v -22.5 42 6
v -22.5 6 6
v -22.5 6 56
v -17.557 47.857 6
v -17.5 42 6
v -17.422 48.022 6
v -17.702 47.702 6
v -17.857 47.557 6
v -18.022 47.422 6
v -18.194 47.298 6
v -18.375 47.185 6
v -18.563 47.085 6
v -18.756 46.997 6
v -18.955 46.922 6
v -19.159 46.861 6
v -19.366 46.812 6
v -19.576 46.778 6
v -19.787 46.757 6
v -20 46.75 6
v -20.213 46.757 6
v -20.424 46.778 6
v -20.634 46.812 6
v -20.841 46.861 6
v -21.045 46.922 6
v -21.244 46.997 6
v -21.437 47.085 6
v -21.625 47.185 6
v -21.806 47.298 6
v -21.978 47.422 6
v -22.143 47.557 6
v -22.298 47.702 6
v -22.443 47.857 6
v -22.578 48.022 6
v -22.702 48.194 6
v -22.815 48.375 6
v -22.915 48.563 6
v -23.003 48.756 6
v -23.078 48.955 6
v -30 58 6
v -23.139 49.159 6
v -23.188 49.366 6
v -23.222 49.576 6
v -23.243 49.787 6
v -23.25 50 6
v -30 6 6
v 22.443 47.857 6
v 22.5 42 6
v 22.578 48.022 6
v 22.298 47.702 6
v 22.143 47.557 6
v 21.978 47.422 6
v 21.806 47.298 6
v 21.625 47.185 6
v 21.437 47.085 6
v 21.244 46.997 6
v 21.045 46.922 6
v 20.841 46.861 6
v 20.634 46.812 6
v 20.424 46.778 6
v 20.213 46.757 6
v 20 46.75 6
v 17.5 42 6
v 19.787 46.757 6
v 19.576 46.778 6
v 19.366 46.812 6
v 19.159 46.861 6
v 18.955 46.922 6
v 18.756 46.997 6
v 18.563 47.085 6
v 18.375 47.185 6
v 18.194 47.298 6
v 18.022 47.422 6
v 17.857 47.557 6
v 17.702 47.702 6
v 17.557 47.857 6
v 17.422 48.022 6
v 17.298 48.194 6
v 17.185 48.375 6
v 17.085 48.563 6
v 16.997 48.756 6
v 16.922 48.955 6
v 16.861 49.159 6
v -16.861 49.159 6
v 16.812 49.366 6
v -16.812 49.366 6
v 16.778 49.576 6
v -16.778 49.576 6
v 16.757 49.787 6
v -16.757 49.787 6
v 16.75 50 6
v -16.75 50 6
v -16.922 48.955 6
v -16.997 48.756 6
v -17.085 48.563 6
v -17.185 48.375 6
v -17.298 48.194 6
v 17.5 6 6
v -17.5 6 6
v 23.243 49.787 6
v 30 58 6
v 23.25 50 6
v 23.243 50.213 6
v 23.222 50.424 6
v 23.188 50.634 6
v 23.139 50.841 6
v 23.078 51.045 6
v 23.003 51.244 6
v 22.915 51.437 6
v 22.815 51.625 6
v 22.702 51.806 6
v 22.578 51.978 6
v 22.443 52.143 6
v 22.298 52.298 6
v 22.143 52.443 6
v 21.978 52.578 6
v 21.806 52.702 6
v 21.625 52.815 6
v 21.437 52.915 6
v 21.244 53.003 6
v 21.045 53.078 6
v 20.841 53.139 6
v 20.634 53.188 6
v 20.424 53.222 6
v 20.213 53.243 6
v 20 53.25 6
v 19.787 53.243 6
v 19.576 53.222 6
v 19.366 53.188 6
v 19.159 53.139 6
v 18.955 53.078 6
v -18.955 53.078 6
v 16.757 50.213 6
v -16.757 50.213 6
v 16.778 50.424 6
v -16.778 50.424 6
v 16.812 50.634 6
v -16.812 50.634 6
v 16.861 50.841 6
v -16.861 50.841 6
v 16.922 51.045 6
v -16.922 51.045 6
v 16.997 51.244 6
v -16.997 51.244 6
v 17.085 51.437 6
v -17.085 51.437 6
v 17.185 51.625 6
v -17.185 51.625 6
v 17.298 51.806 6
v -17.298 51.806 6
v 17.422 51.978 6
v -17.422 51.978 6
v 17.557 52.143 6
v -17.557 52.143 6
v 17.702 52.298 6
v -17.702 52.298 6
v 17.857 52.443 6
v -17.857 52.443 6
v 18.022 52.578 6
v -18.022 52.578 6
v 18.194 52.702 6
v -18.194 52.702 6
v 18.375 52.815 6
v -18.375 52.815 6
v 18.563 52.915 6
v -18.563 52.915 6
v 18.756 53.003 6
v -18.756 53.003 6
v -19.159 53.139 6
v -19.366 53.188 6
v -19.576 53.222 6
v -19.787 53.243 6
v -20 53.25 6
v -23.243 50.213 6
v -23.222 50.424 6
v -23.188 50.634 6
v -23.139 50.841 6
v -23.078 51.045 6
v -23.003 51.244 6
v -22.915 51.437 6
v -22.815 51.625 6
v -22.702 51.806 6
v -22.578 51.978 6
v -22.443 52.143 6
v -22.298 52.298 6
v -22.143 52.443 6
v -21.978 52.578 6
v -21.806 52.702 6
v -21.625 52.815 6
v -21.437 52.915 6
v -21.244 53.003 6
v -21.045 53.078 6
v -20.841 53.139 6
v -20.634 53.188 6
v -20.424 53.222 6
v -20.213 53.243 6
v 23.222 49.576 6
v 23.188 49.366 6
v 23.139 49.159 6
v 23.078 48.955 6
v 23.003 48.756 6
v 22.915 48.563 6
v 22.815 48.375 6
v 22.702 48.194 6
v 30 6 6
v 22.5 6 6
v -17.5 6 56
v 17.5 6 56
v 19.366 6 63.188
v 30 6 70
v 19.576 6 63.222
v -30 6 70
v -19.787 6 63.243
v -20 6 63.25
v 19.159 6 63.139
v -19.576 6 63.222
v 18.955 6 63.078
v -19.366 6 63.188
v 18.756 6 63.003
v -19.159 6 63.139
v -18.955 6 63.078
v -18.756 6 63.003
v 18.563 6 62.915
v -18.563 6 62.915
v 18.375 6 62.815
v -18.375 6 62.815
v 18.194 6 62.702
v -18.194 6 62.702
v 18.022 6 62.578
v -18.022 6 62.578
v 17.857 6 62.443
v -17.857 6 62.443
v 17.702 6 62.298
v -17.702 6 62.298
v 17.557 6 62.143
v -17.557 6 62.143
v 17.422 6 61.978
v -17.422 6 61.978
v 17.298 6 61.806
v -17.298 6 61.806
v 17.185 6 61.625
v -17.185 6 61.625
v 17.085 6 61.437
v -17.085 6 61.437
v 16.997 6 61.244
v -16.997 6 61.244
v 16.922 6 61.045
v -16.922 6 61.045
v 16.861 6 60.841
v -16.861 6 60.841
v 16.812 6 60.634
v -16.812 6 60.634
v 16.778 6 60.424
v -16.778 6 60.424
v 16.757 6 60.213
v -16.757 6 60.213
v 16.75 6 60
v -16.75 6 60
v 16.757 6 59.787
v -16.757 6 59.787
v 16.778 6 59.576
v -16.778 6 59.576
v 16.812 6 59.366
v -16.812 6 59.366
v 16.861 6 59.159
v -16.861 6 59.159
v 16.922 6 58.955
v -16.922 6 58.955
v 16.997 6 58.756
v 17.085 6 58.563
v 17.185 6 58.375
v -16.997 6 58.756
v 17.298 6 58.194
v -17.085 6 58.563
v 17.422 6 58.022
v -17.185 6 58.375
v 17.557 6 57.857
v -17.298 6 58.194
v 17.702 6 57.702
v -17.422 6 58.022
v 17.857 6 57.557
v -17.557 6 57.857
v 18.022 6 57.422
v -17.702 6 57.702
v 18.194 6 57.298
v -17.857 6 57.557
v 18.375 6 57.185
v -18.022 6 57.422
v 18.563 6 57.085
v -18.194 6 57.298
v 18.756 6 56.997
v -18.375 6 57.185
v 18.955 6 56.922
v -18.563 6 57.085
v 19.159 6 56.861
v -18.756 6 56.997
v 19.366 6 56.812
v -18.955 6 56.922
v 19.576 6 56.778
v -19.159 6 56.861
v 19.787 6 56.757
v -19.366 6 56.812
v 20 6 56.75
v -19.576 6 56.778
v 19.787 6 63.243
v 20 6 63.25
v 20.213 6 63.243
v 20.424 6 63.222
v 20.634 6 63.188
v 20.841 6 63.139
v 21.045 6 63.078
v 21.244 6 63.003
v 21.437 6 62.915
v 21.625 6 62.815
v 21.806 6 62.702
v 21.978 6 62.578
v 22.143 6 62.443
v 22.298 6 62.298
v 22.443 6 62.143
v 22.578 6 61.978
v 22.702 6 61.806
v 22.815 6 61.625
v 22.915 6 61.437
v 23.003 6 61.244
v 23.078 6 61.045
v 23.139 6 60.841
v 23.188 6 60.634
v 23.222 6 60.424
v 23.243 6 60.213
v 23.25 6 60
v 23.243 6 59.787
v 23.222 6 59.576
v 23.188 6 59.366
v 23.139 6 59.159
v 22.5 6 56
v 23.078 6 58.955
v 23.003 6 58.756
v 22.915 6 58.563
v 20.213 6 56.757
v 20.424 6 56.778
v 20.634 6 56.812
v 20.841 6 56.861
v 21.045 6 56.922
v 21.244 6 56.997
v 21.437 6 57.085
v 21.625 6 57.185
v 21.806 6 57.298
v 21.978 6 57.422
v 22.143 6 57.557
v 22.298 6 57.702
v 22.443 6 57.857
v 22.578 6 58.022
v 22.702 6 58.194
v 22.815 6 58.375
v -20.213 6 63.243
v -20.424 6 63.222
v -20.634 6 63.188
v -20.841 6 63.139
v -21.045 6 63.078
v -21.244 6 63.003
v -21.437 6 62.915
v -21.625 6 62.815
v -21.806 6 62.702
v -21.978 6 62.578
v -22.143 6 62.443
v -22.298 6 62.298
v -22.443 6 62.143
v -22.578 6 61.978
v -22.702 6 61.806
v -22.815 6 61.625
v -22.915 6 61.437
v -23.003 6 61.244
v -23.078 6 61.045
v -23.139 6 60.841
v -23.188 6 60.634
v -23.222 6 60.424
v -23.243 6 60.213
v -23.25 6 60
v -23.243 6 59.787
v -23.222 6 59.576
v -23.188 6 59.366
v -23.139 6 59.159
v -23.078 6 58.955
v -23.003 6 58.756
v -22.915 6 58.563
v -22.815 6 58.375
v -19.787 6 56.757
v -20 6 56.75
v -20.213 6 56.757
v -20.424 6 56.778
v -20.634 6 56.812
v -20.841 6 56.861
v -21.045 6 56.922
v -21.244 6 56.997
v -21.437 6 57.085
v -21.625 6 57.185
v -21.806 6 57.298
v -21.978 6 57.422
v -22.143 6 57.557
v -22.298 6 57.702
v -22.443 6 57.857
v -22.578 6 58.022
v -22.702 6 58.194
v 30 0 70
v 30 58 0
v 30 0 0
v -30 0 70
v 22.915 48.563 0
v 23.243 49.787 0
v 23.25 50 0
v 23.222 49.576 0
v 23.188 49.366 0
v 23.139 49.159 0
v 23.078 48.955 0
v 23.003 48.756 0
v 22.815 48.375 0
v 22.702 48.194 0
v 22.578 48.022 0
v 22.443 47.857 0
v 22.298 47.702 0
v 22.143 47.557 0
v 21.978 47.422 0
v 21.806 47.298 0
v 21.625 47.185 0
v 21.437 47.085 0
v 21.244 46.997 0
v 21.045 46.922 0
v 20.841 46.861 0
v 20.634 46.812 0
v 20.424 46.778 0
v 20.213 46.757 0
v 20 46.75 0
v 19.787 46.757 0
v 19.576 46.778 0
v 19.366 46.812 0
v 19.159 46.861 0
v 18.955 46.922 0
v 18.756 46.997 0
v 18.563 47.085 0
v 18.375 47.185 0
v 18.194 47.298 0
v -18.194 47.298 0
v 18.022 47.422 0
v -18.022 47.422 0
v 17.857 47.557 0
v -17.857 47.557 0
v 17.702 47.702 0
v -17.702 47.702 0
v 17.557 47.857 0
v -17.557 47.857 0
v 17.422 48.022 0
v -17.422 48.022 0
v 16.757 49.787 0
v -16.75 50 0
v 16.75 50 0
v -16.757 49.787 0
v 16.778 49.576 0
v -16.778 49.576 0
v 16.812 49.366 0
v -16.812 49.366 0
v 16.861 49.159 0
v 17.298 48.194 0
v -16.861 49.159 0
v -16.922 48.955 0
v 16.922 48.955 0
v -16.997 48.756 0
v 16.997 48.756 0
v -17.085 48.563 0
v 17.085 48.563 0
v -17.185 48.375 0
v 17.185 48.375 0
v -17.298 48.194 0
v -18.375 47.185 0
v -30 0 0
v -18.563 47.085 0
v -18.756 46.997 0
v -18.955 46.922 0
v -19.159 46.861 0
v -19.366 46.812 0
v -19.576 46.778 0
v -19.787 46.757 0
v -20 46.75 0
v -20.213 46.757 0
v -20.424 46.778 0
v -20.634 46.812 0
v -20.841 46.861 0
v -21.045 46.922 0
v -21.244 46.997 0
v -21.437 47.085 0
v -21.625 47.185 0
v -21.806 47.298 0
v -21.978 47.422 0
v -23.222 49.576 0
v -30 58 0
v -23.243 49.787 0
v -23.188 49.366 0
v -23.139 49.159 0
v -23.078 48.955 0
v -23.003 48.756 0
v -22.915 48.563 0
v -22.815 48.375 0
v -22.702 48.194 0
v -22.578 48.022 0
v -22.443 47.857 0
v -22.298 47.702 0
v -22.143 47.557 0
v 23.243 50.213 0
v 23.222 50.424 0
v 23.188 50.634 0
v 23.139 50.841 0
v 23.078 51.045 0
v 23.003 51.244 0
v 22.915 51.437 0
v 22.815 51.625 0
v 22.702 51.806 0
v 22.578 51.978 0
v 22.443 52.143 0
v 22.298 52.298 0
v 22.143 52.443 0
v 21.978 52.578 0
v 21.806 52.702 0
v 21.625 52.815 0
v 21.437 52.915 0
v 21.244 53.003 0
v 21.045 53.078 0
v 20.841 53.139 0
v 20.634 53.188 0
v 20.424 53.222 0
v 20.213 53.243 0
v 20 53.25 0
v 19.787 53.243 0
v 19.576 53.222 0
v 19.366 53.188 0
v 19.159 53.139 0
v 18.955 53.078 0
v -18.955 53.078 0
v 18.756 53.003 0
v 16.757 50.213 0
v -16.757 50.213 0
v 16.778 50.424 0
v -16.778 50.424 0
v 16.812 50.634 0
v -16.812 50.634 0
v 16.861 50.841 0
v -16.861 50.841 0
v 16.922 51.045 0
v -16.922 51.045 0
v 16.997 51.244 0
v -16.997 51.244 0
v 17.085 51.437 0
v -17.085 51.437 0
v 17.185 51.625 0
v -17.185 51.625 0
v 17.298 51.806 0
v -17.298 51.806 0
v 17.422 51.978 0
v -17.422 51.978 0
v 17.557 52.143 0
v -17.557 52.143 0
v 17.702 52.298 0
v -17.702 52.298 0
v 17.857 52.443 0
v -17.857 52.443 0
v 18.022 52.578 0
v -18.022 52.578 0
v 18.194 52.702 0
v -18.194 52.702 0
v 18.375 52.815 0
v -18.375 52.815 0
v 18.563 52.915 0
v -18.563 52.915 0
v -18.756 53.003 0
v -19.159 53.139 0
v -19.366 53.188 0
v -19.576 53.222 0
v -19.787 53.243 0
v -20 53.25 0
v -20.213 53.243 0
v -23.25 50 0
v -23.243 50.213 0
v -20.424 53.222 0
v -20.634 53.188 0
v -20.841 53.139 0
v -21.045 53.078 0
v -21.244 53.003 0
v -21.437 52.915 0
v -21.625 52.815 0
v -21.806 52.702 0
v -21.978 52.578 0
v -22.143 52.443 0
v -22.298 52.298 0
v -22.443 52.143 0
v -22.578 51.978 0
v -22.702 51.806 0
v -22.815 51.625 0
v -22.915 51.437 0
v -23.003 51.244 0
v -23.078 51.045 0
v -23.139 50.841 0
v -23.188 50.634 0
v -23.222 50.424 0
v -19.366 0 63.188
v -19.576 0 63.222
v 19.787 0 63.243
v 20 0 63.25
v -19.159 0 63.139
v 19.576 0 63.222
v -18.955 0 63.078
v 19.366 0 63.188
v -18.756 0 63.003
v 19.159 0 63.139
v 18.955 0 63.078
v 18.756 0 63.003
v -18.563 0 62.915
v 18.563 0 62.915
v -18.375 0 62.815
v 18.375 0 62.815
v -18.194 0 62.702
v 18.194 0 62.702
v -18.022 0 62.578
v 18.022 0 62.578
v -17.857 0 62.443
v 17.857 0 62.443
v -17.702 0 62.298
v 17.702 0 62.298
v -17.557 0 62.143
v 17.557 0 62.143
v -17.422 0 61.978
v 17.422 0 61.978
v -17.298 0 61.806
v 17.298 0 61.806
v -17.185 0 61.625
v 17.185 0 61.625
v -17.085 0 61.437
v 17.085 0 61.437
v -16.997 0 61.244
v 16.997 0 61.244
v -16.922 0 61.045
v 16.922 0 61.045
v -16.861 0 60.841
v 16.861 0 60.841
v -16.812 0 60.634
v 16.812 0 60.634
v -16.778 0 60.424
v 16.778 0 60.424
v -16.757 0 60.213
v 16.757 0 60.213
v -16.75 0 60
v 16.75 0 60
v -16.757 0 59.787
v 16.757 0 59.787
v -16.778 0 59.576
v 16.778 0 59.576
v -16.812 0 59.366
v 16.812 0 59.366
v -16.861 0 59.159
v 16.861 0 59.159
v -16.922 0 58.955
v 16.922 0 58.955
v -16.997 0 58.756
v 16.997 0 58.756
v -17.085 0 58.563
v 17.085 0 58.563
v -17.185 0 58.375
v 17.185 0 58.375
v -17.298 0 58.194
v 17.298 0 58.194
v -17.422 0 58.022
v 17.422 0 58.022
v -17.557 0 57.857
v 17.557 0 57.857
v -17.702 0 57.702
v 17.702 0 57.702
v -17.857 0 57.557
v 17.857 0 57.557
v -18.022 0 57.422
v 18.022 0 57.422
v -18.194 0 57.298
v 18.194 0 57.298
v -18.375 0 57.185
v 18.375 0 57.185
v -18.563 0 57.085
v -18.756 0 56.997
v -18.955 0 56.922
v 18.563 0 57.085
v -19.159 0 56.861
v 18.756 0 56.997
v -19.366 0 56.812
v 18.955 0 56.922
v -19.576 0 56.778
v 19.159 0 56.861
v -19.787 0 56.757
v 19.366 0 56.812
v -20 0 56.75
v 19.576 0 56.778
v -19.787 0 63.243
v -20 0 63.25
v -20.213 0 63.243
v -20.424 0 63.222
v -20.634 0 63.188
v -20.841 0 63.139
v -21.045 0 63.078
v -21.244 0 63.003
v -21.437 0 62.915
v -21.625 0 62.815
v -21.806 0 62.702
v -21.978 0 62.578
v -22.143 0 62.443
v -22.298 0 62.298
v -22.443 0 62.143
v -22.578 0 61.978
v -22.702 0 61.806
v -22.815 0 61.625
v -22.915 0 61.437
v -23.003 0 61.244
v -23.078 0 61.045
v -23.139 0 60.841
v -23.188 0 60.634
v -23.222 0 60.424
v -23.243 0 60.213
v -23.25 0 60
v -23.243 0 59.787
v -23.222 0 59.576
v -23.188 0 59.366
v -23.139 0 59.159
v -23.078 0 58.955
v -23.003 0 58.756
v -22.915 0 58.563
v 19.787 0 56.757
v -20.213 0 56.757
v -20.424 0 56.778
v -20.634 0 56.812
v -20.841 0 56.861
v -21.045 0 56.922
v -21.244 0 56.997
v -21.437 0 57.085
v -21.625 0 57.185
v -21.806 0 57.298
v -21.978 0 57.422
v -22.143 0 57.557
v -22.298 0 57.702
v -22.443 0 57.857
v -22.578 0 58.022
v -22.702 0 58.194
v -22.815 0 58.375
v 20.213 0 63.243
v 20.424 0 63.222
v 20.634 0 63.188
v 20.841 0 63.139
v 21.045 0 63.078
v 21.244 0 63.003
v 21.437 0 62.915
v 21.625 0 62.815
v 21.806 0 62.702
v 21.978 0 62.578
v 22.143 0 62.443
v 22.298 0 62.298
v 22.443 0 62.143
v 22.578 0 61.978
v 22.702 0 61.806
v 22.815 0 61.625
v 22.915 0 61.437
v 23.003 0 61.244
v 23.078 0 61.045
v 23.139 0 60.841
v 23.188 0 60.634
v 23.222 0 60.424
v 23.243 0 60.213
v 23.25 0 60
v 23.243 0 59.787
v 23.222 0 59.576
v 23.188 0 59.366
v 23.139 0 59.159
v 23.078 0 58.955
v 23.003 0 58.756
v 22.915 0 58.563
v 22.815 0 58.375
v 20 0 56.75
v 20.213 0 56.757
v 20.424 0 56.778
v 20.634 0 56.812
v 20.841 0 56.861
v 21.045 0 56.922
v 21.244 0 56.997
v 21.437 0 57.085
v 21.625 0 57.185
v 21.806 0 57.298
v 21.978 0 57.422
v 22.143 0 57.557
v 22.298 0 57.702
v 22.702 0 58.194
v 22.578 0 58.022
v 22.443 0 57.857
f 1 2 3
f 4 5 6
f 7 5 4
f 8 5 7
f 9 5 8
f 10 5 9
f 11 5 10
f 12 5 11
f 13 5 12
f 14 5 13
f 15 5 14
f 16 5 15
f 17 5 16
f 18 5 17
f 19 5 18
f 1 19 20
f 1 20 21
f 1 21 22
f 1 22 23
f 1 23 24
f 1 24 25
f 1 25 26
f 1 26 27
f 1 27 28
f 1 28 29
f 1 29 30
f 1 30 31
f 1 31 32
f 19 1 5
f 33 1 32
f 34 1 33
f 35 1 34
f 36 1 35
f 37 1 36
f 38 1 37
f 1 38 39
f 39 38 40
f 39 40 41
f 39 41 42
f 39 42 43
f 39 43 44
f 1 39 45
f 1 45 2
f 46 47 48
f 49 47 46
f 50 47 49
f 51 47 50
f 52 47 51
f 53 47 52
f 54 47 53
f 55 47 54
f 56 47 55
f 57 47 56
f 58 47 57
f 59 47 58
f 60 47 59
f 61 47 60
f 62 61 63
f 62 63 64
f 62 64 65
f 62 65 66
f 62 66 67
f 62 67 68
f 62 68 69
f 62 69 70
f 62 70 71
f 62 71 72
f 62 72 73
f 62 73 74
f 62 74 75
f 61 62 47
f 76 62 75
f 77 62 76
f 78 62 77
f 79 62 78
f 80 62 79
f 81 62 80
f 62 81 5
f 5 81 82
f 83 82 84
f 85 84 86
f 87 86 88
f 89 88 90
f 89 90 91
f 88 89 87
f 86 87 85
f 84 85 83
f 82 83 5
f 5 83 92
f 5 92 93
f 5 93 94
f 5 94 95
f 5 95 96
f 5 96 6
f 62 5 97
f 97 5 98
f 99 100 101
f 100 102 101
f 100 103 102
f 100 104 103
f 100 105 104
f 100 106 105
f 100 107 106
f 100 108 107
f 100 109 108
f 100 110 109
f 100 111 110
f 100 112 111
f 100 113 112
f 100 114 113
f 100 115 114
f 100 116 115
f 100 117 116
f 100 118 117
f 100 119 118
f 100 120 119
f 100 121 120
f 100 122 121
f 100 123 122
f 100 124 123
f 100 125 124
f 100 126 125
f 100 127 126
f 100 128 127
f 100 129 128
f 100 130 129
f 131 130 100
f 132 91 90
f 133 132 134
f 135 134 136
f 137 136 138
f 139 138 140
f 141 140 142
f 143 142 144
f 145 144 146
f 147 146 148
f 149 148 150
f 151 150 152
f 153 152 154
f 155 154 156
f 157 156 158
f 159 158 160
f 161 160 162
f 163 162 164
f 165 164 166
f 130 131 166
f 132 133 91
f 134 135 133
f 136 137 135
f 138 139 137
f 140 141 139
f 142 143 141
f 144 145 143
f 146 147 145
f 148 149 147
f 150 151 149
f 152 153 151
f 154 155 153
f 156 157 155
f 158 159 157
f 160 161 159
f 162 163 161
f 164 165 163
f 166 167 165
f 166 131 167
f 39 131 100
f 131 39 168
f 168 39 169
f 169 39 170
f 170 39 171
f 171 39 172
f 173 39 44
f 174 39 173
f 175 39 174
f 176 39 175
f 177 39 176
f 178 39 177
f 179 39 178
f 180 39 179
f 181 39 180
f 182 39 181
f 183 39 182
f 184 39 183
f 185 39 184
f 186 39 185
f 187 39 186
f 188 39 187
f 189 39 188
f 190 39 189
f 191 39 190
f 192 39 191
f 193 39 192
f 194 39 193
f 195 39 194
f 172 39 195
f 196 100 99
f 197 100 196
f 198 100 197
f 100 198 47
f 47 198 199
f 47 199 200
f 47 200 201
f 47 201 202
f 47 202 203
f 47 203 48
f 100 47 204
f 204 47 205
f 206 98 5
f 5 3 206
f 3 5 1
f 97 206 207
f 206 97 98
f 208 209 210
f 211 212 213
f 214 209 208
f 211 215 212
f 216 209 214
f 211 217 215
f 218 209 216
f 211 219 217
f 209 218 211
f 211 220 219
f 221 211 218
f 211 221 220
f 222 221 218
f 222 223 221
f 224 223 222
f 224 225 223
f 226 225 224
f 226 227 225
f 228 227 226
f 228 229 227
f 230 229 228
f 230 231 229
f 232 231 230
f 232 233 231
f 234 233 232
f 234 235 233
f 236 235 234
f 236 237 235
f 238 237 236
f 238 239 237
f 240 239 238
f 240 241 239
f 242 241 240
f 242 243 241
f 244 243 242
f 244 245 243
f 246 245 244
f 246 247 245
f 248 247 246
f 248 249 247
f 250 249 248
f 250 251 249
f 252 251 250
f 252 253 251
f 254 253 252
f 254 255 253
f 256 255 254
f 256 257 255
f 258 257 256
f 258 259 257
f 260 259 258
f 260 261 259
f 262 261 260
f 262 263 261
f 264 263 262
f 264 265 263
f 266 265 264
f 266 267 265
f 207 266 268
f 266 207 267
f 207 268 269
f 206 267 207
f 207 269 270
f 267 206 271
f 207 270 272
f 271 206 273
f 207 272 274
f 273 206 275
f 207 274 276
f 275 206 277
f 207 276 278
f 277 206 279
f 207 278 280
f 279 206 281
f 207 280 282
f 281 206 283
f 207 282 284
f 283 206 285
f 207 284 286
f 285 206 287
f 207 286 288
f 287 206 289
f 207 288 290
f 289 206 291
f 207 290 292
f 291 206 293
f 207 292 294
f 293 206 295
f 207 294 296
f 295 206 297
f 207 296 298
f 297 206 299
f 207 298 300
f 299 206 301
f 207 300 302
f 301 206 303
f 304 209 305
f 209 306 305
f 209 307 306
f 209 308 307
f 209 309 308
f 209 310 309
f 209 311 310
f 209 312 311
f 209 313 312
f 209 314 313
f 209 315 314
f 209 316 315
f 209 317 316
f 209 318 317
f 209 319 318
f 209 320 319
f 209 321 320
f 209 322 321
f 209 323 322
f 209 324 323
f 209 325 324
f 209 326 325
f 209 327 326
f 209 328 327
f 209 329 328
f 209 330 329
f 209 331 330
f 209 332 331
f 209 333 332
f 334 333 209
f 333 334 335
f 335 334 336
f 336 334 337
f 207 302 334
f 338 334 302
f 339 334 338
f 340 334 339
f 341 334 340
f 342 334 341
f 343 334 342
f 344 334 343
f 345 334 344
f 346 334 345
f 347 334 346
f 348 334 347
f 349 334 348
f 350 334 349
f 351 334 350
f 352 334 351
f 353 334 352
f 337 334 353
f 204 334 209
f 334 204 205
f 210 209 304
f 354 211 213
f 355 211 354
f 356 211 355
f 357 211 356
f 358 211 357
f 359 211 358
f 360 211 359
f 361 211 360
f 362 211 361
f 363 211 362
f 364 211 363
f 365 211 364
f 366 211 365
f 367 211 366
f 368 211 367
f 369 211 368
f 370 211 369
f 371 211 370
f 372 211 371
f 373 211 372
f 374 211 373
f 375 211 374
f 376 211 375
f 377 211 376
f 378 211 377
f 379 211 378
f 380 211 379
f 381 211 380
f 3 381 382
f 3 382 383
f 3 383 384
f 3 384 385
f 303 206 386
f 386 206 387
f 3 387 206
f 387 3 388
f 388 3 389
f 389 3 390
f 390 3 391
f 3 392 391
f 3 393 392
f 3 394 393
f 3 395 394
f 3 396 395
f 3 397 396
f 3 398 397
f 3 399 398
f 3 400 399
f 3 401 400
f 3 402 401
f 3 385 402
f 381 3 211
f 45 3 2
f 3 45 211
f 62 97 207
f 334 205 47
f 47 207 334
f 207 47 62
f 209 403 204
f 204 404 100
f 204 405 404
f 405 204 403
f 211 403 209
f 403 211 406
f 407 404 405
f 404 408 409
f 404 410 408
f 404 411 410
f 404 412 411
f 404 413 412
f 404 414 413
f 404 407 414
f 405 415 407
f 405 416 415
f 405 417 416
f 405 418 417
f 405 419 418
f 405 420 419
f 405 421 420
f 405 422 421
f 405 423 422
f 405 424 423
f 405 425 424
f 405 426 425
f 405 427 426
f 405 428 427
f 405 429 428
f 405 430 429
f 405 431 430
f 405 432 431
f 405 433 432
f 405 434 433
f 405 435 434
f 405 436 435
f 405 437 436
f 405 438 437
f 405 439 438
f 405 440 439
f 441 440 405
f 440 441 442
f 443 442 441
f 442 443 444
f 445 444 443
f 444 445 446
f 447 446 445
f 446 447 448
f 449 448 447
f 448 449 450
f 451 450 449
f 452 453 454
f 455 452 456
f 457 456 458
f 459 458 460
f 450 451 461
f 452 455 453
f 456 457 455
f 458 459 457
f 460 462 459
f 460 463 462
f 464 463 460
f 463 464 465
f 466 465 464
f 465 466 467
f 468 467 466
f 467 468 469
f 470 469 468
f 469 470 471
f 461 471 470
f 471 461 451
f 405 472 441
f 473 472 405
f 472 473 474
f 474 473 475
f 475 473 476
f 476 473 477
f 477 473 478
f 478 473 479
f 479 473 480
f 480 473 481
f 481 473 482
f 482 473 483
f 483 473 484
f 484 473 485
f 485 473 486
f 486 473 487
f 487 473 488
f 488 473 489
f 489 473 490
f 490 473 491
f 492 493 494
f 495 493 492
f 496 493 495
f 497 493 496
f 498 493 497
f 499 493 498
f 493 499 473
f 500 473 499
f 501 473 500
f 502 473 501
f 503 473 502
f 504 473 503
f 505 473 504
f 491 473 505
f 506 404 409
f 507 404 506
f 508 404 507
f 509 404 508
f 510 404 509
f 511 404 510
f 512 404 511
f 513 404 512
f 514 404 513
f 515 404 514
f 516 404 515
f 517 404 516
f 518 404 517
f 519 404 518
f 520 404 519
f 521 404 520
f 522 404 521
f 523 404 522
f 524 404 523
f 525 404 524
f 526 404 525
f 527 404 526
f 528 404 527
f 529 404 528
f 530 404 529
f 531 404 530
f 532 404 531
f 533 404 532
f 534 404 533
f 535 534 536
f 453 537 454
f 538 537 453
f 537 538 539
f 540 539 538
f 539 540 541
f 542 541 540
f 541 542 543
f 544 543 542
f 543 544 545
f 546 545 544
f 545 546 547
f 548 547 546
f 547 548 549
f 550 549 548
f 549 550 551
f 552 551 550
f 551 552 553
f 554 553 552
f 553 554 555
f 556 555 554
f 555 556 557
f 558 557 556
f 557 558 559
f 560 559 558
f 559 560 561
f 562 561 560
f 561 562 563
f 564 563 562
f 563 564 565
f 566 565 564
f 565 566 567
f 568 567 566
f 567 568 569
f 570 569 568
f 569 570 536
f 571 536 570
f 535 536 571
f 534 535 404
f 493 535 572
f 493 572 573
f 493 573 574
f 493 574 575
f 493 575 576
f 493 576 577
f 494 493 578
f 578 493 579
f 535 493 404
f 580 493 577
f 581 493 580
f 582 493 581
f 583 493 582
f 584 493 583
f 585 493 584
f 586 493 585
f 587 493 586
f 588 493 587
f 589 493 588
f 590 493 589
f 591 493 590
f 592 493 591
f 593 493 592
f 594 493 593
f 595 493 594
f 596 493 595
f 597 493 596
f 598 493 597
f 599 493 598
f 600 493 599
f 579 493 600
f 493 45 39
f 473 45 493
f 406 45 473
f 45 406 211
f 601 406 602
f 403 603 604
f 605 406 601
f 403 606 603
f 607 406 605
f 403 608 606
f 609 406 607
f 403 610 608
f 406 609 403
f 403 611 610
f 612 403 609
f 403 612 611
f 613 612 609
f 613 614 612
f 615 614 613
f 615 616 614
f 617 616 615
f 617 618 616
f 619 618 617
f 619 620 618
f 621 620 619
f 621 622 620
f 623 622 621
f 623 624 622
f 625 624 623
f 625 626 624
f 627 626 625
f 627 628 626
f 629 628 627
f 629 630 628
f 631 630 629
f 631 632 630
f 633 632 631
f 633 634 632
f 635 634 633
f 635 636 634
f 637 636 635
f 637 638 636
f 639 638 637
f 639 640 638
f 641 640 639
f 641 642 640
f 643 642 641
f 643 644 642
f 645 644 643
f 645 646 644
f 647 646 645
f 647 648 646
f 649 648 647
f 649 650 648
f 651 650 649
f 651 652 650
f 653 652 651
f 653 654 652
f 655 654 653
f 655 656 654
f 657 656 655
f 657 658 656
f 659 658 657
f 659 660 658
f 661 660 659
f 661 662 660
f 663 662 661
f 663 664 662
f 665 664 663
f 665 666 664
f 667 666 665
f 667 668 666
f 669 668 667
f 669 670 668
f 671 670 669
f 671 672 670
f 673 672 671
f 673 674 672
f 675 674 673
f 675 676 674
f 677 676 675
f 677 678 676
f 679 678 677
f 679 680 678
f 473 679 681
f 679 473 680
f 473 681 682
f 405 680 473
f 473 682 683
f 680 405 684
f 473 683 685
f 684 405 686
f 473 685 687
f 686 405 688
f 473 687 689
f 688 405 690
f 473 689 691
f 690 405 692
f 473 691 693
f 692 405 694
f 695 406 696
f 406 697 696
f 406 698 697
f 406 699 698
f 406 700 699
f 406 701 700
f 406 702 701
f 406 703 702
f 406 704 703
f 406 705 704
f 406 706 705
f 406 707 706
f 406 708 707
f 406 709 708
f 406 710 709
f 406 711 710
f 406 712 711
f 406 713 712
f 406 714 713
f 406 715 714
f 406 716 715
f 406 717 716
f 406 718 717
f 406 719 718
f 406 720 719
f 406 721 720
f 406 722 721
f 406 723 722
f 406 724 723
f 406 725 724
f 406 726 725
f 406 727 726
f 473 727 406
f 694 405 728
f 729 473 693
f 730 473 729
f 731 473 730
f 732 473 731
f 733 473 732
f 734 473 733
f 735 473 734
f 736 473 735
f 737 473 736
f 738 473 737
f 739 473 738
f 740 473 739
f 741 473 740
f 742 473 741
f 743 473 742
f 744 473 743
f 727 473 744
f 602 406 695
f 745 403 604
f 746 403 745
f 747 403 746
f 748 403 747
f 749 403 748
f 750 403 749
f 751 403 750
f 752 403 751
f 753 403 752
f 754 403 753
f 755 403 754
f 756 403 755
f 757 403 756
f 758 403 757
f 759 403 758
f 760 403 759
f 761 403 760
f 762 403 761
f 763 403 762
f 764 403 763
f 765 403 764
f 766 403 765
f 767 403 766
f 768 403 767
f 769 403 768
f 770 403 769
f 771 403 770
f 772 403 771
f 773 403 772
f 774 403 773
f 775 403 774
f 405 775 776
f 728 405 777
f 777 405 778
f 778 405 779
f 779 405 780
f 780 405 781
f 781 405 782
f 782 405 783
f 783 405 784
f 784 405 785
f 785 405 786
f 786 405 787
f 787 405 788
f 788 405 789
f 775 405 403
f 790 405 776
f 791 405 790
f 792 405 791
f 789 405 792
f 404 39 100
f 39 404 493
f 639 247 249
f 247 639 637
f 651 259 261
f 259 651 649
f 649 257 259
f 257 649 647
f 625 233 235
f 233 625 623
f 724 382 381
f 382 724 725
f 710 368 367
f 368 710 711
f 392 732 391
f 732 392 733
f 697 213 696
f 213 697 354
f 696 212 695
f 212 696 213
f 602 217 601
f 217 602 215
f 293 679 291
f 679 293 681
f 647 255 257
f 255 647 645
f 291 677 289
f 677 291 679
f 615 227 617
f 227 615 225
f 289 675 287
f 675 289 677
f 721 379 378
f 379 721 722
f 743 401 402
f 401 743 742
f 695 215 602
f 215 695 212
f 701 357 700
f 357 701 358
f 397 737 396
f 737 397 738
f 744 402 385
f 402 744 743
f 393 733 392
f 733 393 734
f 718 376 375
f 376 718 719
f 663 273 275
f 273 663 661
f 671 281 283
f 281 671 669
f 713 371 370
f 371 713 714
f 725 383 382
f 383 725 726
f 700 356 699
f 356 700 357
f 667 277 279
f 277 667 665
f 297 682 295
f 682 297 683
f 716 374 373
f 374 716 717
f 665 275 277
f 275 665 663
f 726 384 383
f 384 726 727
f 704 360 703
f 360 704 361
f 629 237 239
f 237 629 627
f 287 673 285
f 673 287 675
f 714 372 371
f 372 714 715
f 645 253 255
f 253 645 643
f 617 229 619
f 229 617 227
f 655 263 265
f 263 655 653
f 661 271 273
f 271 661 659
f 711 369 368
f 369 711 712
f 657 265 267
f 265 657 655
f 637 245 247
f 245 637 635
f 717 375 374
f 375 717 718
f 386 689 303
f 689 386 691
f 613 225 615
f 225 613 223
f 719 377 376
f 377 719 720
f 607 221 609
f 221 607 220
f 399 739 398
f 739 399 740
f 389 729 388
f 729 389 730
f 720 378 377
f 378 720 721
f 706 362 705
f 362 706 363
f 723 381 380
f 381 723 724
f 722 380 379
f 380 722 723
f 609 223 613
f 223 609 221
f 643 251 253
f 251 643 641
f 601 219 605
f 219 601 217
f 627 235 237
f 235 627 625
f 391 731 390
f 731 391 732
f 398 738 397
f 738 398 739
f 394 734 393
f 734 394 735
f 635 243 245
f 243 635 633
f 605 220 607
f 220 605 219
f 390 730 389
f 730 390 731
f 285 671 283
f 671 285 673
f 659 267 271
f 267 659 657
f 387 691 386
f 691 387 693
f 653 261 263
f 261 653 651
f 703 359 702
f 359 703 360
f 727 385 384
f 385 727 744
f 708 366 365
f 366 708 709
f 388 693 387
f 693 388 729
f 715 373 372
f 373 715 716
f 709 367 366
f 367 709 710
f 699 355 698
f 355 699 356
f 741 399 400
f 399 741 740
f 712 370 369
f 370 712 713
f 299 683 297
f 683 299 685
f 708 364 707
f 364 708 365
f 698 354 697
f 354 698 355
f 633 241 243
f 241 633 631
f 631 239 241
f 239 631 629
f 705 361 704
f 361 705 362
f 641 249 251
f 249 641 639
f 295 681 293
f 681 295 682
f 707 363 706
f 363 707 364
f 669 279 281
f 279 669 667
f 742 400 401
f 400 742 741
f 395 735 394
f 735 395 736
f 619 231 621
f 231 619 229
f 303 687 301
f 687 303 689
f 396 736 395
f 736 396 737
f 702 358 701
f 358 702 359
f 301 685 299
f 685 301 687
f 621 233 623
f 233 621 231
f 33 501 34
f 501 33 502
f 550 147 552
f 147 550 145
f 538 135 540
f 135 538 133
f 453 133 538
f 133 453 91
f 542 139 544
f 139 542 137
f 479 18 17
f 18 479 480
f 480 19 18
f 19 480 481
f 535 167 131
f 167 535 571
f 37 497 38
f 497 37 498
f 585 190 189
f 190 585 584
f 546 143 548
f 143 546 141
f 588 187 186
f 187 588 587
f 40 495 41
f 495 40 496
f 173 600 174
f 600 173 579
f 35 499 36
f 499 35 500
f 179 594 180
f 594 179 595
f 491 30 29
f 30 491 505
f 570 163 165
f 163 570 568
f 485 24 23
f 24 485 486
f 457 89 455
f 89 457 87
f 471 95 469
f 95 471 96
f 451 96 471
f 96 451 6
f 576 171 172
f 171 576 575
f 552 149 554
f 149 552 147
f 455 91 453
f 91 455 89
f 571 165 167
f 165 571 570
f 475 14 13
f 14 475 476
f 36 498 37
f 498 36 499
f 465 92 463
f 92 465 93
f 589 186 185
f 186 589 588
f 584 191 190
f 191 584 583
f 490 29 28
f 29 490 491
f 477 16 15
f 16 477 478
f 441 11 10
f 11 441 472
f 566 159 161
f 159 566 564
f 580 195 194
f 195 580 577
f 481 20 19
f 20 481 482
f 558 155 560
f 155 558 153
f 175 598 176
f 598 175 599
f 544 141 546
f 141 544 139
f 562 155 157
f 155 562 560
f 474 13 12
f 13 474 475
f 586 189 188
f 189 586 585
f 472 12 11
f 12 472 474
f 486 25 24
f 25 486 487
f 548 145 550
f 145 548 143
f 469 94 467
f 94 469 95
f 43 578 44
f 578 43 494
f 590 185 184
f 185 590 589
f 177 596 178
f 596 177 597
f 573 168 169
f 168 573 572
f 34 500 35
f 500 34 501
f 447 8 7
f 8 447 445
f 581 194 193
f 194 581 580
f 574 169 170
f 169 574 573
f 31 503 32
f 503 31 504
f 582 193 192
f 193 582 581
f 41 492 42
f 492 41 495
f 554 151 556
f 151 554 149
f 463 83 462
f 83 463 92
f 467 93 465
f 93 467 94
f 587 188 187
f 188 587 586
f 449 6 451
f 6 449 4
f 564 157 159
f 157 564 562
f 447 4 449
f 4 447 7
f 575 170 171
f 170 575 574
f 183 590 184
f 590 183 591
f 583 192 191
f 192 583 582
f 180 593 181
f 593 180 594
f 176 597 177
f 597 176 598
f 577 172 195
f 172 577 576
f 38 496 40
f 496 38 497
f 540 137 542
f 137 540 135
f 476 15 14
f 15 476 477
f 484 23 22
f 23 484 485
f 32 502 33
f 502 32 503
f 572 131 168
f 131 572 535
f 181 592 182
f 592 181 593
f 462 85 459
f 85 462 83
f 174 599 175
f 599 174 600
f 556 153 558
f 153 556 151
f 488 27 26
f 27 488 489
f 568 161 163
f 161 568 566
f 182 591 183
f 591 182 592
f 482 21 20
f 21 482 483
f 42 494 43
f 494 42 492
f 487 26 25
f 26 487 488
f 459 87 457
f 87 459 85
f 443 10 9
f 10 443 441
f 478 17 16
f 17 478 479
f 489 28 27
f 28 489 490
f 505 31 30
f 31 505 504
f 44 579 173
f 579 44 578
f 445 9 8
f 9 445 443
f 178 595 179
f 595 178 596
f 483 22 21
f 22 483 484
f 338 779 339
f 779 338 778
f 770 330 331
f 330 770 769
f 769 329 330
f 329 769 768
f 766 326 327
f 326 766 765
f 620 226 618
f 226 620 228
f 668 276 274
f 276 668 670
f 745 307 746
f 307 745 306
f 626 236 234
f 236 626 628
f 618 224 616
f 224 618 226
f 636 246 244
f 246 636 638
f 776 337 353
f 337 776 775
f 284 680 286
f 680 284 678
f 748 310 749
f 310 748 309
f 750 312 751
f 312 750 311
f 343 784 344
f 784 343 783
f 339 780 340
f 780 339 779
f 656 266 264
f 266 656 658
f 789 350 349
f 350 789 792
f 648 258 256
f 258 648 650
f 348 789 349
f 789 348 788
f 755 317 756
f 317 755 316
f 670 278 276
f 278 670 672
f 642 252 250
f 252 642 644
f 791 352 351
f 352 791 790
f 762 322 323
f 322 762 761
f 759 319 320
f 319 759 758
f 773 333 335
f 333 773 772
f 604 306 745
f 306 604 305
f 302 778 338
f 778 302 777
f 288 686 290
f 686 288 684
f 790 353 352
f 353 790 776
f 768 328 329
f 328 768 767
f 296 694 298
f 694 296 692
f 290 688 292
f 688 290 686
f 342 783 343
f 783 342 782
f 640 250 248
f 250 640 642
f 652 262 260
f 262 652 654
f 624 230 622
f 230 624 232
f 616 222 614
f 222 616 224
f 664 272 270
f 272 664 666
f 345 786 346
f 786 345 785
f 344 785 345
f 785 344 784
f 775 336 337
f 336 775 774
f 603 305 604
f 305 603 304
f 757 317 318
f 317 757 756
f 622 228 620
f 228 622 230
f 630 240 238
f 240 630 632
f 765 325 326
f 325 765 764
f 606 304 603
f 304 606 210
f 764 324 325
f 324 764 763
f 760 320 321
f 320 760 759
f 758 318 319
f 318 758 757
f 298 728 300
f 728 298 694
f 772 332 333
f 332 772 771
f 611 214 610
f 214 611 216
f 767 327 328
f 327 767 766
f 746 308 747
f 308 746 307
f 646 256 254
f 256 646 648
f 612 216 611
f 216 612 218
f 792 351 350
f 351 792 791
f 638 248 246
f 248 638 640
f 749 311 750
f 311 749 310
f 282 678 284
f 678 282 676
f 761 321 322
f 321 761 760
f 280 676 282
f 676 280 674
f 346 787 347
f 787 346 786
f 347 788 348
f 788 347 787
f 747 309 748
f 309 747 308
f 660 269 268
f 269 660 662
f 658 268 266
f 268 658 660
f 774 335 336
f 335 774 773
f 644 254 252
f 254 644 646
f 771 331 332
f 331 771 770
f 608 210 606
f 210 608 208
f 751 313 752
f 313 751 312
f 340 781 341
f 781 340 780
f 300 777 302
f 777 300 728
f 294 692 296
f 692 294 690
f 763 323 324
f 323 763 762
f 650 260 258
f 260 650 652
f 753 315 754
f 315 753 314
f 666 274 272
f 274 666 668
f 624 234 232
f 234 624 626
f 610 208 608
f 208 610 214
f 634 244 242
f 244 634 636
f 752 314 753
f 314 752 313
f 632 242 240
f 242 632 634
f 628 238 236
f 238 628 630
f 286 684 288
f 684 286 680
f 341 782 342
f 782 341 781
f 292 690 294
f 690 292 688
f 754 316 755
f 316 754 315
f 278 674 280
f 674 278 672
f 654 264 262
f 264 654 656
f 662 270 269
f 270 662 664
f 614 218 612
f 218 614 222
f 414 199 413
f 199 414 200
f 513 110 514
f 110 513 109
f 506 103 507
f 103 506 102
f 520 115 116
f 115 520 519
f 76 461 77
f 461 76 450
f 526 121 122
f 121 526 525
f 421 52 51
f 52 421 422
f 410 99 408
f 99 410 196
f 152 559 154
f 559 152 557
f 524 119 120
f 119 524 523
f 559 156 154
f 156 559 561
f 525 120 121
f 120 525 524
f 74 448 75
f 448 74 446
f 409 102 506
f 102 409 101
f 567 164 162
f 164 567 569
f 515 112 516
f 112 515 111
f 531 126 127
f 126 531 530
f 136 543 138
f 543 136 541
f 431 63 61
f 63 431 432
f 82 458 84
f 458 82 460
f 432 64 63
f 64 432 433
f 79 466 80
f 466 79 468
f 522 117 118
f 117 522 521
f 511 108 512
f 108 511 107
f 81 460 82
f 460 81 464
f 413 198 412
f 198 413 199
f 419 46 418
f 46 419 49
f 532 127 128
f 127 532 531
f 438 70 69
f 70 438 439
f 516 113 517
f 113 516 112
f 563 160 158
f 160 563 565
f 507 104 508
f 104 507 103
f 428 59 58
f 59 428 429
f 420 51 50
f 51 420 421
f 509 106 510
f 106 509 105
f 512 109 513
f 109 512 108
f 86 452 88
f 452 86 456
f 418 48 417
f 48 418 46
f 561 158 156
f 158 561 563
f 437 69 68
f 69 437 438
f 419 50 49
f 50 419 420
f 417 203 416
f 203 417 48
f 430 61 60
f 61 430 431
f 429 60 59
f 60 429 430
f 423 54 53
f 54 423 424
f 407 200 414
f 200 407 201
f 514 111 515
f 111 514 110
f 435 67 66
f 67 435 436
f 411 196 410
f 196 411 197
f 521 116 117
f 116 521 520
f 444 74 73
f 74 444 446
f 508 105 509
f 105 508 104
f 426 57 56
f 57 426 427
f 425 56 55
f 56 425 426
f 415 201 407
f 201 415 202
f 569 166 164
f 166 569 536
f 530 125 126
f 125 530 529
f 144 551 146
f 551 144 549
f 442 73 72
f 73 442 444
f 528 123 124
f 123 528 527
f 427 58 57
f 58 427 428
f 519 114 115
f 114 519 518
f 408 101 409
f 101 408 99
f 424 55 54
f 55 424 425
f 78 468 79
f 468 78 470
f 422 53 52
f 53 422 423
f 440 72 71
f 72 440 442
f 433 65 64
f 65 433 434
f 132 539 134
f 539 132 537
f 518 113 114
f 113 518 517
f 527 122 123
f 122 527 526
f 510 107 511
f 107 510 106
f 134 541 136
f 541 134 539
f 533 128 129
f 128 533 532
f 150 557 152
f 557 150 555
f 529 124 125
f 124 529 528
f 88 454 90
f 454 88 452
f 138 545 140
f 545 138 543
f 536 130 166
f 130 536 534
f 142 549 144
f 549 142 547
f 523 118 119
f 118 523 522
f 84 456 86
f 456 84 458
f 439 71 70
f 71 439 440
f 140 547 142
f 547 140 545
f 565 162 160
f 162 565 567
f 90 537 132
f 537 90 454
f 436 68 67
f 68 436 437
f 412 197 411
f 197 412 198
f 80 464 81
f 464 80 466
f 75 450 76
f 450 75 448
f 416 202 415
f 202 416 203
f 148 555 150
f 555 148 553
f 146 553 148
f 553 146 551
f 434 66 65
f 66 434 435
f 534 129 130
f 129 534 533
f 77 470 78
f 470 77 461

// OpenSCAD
// t3-008 gusseted right-angle bracket
$fn = 96;
plate_width = 60;
plate_thickness = 6;
vertical_height = 70;
horizontal_depth = 58;
gusset_thickness = 5;
gusset_y_leg = 36;
gusset_z_leg = 50;
gusset_x = 20;
hole_diameter = 6.5;
vhole_z = 60;
hhole_y = 50;

difference() {
    union() {
        translate([-plate_width / 2, 0, 0]) cube([plate_width, plate_thickness, vertical_height]);
        translate([-plate_width / 2, 0, 0]) cube([plate_width, horizontal_depth, plate_thickness]);
        for (s = [-1, 1])
            translate([s * gusset_x - gusset_thickness / 2, 0, 0])
                rotate([90, 0, 90]) linear_extrude(gusset_thickness)
                    polygon([
                        [plate_thickness, plate_thickness],
                        [plate_thickness + gusset_y_leg, plate_thickness],
                        [plate_thickness, plate_thickness + gusset_z_leg]
                    ]);
    }
    for (s = [-1, 1]) {
        translate([s * gusset_x, -1, vhole_z]) rotate([-90, 0, 0])
            cylinder(d = hole_diameter, h = plate_thickness + 2);
        translate([s * gusset_x, hhole_y, -1])
            cylinder(d = hole_diameter, h = plate_thickness + 2);
    }
}
